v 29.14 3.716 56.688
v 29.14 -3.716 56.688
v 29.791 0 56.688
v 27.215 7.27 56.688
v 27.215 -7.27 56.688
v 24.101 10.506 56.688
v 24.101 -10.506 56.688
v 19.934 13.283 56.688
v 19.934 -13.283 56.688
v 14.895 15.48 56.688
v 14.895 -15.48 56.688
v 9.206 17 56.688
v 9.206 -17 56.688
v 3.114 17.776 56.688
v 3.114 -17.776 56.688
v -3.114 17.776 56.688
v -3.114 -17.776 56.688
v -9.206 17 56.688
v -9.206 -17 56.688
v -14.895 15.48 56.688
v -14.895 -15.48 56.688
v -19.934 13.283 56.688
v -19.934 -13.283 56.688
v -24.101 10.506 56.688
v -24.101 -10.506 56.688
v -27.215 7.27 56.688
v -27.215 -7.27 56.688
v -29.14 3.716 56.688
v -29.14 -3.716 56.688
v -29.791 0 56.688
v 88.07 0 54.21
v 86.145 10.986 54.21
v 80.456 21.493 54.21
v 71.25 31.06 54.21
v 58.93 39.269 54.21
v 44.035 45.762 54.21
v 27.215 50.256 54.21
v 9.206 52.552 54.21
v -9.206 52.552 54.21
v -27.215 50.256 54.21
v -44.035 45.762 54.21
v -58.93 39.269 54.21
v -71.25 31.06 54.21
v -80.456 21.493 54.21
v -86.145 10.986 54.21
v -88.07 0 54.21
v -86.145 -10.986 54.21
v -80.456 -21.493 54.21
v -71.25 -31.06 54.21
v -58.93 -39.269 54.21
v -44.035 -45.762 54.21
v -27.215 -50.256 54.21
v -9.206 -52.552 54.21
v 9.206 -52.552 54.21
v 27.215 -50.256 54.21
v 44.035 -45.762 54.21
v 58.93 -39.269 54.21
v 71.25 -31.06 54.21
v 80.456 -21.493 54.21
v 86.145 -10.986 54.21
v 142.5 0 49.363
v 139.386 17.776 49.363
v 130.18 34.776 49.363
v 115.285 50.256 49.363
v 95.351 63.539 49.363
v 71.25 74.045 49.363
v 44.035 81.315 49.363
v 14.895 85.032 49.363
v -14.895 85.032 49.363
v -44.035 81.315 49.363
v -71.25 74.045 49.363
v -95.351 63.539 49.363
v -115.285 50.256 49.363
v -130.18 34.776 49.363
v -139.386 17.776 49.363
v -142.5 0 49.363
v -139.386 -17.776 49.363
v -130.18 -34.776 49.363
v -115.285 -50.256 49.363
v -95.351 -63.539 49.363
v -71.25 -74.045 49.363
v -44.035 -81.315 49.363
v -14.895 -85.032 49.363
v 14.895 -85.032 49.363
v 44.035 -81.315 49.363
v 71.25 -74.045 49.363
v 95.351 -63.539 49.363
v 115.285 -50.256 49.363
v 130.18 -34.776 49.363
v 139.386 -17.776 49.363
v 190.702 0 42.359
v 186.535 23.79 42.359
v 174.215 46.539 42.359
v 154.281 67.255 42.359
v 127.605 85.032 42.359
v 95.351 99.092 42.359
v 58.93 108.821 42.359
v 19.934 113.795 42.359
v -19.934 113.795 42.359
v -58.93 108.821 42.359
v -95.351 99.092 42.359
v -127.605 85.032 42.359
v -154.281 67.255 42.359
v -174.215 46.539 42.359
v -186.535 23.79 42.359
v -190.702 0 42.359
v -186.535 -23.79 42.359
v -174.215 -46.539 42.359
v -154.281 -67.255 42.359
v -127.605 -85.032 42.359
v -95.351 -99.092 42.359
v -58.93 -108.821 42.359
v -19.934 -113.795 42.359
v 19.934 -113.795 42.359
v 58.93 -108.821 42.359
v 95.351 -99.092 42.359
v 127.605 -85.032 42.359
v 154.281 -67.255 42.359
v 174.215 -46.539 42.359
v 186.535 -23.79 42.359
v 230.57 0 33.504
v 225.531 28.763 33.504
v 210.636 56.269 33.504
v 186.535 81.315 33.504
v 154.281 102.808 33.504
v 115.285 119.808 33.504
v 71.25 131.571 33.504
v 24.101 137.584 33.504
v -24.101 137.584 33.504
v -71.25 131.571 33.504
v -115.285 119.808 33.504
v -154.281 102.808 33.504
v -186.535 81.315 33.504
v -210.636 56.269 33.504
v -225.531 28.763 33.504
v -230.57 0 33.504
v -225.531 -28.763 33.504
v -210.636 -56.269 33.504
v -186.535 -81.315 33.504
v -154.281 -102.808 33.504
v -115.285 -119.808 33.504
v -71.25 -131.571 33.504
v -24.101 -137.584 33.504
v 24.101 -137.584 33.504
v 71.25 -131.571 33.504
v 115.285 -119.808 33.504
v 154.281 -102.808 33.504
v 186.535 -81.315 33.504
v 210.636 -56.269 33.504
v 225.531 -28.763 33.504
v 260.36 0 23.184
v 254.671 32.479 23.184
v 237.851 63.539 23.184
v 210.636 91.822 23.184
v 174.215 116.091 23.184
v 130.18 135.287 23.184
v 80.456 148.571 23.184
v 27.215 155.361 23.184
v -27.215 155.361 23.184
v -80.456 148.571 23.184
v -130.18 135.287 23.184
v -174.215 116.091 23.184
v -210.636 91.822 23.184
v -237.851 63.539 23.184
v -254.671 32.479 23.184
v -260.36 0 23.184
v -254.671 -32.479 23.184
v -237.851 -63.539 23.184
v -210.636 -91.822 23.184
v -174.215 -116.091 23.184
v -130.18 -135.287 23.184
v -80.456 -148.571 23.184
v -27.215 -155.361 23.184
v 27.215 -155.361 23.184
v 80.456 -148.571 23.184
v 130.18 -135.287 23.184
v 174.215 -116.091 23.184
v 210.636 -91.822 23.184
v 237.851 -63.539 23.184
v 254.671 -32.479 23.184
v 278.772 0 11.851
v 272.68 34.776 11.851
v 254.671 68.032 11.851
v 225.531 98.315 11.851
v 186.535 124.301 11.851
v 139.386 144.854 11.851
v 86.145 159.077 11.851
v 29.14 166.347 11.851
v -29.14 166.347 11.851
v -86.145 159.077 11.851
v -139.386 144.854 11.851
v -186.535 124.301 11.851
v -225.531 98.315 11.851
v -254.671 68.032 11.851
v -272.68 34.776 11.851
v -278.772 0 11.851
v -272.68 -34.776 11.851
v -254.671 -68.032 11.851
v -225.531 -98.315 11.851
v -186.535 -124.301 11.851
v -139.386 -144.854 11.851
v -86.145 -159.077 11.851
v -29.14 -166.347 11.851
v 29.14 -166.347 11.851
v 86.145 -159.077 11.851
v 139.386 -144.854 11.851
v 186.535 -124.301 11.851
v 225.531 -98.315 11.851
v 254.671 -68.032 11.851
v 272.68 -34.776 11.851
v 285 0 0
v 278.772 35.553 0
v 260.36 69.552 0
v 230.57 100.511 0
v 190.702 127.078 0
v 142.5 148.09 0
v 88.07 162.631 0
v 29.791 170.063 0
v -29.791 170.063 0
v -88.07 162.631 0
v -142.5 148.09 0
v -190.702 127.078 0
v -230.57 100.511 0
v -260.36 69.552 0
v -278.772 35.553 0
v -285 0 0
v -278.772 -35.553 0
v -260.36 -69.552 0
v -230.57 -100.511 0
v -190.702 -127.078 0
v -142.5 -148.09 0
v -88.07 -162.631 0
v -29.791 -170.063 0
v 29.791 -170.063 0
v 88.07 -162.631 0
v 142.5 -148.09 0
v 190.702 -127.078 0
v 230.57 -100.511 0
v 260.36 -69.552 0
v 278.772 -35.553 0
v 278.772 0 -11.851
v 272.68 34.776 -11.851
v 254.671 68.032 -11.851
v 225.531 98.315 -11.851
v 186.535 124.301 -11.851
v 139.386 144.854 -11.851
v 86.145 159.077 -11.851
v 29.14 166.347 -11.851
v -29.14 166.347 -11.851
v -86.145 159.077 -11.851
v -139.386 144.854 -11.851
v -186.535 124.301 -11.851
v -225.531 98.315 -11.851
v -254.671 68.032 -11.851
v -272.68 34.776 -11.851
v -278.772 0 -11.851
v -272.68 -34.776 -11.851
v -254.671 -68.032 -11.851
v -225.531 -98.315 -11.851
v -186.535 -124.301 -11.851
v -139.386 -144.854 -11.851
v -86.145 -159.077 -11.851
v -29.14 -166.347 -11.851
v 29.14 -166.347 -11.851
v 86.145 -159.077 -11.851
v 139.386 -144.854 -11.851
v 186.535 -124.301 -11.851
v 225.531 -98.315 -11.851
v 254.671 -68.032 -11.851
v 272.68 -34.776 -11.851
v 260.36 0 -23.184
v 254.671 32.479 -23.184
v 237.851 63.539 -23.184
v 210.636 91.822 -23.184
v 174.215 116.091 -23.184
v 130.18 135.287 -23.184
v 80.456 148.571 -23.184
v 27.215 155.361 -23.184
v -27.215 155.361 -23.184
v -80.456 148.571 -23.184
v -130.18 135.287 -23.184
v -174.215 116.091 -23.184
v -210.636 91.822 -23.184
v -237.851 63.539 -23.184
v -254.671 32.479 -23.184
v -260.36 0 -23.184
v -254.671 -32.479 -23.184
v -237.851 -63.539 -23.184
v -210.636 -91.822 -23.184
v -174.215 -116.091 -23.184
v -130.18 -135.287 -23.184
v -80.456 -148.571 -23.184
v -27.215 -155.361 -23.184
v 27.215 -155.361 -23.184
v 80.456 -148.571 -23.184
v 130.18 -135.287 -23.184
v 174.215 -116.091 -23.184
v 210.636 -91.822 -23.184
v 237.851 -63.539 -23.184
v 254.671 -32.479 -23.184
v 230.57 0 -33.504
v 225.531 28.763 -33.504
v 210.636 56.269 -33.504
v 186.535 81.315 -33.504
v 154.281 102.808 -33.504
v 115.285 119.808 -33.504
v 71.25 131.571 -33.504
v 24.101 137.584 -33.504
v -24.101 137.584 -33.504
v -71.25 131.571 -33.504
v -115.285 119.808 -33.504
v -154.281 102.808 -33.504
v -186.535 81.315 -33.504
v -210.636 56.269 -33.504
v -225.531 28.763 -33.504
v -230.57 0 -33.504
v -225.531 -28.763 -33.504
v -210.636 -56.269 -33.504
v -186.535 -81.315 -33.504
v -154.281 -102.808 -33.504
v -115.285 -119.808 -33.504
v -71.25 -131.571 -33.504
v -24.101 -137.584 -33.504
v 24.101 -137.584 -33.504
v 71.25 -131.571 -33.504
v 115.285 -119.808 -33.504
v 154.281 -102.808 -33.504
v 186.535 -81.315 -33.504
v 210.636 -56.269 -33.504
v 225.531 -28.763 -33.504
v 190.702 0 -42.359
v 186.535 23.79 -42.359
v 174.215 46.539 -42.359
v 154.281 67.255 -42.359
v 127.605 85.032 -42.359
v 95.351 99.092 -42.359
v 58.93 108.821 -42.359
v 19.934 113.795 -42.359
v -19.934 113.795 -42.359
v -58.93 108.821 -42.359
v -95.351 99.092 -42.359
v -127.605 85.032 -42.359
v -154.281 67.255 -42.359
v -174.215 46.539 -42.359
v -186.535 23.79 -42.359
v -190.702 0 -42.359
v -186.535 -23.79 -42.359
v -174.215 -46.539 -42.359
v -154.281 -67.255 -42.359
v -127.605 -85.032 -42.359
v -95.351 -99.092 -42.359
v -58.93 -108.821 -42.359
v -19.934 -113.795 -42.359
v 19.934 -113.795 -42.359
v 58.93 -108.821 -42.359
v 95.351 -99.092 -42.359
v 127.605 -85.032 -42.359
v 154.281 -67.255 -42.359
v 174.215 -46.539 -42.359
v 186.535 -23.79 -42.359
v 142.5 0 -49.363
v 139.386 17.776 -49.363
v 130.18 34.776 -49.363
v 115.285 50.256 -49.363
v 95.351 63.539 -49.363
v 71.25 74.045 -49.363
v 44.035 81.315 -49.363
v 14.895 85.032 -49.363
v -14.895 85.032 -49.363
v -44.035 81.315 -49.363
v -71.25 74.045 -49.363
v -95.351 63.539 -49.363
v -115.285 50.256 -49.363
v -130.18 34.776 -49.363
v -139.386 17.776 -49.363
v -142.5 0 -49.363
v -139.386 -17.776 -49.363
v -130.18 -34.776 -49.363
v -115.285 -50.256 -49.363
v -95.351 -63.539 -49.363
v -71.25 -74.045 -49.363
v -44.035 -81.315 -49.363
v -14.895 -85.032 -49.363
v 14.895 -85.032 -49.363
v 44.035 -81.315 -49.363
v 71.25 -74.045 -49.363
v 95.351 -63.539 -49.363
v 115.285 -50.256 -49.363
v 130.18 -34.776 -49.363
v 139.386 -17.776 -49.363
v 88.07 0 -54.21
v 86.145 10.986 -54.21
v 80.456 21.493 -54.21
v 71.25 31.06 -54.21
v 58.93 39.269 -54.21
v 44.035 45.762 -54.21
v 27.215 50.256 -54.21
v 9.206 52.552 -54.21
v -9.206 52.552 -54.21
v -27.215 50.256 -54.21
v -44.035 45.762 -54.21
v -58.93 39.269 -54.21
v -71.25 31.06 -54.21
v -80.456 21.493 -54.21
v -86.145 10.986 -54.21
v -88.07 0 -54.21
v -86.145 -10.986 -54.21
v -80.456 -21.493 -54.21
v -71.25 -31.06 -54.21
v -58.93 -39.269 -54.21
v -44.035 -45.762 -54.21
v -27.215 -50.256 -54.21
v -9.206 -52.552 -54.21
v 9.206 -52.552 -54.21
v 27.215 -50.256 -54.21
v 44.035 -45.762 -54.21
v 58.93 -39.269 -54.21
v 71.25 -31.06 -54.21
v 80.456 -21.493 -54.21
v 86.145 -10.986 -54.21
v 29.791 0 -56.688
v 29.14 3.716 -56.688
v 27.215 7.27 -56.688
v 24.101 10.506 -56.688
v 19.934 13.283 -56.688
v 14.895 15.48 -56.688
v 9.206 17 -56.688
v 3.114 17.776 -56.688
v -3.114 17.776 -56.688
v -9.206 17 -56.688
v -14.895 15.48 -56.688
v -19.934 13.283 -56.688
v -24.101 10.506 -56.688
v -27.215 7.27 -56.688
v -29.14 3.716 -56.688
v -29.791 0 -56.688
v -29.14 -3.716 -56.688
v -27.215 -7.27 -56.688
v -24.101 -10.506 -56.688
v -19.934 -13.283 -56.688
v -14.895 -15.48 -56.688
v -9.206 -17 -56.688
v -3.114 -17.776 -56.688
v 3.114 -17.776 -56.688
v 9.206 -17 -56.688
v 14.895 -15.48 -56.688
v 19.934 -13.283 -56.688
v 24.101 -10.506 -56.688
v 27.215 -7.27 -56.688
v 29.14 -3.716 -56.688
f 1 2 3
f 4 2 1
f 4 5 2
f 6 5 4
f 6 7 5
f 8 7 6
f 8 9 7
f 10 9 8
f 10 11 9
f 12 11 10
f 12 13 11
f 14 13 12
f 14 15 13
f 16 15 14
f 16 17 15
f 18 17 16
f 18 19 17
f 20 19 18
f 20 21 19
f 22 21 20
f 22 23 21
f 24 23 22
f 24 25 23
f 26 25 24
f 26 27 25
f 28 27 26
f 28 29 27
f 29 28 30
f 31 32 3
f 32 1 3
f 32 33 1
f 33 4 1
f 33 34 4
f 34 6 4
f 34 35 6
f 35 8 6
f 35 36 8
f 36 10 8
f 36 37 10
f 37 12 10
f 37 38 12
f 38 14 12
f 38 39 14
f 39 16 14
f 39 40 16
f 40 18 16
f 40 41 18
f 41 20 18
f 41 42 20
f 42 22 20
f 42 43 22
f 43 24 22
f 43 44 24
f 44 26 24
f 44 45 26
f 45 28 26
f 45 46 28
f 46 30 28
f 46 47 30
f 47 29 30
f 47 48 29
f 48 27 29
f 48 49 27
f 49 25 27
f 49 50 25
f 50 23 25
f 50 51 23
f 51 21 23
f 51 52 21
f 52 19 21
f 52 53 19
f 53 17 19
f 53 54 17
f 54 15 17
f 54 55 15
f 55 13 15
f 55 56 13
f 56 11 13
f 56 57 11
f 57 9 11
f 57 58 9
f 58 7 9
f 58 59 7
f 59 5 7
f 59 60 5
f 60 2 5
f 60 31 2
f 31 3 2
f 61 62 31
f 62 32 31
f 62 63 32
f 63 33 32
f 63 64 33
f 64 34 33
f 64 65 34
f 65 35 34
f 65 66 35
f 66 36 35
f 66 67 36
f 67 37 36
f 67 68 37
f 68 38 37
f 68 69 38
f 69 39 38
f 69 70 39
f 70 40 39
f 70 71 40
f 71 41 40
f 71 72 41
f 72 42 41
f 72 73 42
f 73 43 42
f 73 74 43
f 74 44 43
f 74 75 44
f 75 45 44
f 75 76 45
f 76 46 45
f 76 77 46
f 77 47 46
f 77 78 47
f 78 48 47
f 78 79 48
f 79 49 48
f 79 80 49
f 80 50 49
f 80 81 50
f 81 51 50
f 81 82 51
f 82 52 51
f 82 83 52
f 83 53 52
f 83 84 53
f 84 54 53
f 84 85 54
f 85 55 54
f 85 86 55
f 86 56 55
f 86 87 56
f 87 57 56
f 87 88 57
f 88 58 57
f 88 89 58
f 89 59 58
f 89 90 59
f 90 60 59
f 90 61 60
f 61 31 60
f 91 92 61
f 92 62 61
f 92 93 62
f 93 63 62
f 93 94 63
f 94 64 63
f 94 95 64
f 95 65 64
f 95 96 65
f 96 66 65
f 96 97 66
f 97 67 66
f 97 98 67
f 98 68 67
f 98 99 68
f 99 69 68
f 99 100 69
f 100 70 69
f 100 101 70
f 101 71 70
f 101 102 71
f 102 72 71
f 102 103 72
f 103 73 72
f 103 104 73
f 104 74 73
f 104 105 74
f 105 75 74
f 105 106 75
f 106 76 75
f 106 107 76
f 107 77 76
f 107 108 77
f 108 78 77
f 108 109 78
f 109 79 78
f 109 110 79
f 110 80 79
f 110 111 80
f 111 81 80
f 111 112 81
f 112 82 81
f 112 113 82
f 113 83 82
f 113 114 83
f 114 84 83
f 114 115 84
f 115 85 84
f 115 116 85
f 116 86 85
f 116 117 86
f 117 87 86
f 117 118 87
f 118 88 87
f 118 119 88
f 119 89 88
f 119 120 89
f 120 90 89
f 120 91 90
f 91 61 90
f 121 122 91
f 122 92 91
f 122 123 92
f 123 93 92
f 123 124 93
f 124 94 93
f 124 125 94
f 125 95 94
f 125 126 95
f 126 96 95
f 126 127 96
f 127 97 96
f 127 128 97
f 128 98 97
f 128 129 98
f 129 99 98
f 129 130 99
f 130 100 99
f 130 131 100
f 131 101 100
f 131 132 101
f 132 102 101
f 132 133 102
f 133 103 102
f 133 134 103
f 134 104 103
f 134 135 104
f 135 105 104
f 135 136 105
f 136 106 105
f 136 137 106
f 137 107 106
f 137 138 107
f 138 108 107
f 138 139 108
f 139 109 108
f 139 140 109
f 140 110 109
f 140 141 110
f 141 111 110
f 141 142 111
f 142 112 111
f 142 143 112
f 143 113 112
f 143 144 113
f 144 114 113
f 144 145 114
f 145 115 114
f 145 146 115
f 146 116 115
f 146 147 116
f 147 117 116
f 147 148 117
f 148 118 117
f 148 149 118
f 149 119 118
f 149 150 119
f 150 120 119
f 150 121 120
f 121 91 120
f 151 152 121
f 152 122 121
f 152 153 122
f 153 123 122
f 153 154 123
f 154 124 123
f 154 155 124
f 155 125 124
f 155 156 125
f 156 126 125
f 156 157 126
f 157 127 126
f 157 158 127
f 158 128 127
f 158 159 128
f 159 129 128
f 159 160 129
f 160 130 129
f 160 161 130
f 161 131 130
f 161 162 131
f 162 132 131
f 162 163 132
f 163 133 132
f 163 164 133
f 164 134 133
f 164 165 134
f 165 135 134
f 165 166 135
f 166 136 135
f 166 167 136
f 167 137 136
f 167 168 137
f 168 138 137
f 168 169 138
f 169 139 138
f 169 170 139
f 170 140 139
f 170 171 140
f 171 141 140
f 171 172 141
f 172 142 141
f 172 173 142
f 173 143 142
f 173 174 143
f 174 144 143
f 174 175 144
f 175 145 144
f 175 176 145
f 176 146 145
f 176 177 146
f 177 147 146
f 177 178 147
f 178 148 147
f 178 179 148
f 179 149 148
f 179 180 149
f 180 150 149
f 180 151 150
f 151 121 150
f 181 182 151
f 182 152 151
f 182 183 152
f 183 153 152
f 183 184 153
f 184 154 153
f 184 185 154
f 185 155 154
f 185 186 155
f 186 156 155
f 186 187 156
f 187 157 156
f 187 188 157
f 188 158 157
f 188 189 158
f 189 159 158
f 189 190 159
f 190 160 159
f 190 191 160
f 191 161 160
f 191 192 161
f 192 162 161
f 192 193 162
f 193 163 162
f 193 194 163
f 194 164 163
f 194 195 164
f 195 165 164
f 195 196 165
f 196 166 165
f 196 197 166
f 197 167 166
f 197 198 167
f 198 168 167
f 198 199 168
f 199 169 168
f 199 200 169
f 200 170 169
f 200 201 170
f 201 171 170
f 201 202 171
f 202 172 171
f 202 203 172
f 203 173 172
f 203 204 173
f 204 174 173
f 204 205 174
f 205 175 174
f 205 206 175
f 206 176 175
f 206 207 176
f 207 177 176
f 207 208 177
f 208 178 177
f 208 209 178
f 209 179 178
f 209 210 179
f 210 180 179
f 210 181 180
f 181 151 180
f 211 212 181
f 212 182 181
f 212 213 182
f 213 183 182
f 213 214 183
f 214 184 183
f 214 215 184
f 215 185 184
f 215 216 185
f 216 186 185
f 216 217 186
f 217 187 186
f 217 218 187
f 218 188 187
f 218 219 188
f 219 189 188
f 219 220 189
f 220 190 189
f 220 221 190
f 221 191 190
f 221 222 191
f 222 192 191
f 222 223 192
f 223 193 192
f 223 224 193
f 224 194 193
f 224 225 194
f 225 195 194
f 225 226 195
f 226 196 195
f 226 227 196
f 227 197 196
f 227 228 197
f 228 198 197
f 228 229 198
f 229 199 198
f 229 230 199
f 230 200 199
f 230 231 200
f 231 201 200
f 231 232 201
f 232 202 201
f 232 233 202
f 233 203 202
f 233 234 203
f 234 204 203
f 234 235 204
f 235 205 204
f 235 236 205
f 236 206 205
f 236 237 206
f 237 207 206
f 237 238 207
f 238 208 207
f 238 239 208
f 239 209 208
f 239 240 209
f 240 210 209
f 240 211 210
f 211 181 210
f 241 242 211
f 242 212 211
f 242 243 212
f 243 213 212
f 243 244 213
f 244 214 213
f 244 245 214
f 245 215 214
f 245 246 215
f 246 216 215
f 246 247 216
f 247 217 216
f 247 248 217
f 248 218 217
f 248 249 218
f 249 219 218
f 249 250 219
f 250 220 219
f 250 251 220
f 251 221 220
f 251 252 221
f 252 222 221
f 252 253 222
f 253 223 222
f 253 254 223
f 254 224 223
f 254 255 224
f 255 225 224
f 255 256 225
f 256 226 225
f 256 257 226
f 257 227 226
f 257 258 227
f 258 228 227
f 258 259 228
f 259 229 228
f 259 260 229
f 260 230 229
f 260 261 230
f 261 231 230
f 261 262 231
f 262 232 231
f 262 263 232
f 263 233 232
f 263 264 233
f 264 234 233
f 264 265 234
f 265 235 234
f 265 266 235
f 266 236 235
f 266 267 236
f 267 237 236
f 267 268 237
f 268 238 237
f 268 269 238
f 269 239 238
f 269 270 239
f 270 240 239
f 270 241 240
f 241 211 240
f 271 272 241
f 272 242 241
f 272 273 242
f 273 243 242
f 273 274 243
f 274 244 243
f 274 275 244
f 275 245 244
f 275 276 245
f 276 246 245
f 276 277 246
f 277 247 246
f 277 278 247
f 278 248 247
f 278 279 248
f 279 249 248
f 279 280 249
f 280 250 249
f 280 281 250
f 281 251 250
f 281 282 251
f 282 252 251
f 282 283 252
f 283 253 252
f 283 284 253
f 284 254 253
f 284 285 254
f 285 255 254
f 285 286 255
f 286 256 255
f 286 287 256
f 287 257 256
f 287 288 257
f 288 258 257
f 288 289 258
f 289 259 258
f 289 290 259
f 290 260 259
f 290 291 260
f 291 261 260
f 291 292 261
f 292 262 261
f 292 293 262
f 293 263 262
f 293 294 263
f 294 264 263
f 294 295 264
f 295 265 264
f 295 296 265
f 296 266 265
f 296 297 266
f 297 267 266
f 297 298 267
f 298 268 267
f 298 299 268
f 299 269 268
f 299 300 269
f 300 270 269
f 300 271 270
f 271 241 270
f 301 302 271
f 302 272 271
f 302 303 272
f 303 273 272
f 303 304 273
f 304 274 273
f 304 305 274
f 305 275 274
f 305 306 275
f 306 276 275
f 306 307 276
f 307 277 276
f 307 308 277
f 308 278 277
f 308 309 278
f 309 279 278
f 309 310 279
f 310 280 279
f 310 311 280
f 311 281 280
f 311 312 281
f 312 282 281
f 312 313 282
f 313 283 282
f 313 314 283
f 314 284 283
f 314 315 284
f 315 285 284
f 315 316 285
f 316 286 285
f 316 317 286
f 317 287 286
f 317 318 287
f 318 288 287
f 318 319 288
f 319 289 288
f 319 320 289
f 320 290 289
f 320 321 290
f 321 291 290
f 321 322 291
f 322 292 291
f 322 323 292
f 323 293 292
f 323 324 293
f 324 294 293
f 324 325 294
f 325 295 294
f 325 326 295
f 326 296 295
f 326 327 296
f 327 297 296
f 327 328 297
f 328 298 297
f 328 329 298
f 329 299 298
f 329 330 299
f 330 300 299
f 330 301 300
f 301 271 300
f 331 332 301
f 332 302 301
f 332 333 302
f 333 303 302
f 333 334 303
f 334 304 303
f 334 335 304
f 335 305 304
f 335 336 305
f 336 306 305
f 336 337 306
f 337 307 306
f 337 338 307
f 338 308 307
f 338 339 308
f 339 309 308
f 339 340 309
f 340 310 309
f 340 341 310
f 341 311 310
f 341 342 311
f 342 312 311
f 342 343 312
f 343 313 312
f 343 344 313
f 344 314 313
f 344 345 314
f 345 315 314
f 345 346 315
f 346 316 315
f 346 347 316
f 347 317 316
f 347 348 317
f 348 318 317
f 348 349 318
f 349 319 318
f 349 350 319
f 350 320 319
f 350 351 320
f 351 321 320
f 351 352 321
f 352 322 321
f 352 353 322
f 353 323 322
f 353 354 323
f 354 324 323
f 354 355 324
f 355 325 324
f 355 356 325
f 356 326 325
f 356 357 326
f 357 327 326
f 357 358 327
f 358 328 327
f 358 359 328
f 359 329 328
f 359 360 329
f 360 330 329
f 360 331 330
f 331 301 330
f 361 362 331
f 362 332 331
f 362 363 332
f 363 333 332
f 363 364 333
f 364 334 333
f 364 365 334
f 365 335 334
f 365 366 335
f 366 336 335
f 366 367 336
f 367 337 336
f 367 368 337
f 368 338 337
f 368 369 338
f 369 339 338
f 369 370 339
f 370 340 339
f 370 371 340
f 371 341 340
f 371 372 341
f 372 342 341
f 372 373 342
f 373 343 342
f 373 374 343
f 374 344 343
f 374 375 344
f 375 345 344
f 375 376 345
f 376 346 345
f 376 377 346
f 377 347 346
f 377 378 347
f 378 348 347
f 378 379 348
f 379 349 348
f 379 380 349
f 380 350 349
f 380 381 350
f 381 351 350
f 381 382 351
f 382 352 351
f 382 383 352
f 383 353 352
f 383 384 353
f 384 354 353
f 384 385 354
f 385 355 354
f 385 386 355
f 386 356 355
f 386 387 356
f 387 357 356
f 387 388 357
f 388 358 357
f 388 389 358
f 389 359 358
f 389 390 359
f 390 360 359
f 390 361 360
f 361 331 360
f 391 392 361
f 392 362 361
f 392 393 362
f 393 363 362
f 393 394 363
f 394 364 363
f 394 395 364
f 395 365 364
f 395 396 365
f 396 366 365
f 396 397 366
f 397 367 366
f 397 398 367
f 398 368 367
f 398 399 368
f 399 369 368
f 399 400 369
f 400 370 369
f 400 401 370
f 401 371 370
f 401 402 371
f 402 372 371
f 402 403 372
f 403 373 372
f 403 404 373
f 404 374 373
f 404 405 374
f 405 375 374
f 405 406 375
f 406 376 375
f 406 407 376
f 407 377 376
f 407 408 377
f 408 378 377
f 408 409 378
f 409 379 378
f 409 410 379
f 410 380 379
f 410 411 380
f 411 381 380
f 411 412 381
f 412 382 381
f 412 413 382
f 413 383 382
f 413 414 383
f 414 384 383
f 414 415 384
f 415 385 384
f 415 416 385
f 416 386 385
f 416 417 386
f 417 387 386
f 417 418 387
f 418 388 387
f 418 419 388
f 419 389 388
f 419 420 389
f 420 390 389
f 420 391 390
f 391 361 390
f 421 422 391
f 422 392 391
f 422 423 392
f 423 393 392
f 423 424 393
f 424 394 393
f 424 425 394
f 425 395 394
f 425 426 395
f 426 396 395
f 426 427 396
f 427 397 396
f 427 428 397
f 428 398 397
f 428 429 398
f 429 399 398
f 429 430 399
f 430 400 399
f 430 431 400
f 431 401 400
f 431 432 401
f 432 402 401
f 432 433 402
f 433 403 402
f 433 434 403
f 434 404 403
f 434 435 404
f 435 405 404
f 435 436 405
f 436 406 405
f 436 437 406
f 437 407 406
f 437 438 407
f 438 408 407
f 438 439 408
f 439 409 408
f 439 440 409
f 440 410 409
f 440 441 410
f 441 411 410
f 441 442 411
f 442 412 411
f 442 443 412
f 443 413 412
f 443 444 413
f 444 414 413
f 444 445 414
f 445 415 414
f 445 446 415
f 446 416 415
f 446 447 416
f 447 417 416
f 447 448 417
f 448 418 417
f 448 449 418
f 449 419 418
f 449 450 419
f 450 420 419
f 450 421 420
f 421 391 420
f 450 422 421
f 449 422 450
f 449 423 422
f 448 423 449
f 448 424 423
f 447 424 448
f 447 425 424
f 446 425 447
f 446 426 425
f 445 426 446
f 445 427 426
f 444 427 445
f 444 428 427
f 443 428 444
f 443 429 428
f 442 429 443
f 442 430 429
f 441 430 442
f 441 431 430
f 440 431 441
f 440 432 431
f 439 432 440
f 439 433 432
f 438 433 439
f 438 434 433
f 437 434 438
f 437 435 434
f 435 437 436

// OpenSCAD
// Generated by SolidPython 1.0.1 on 2020-07-29 00:46:51


scale(v = [15, 9, 3]) {
	sphere(r = 19);
}
/***********************************************
*********      SolidPython code:      **********
************************************************
 
# import packages: SolidPython
from solid import *
from solid.utils import *
from itertools import chain, combinations, permutations


class Resize:

    def __init__(self, scad_file):
        self.scad_file = scad_file
        #self.scad_file = import_scad(scad_file)
        # cone/cylinder param:
        self.r1 = 0
        self.r2 = 0
        self.h = 0
        # rectangular prism param:
        self.w = 0
        self.l = 0
        # ellipse param:
        self.r = 0

    # import OpenScad code (file name corresponds to shape)


    # classify shape + parameters
    def assign(self, param1, param2, param3):
        if self.scad_file == 'cone.scad':
            self.r1 = param1
            self.r2 = param2
            self.h = param3
        elif self.scad_file == 'cylinder.scad':
            self.r1 = param1
            self.r2 = param2
            self.h = param3
        elif self.scad_file == 'rectangularPrism.scad':
            self.h = param1
            self.l = param2
            self.w = param3
        else:
            self.r = param1
            self.h = param2

    # resize parameters
    def iterate(self):
        x = range(3, 20, 2)
        i = 1
        if self.scad_file == 'cone.scad':
            tempList = list(permutations(x, 2))
            for temp in tempList:
                param1 = temp[0]
                param2 = temp[1]
                filepath = 'produced_scad_files/' + 'cone' + str(param1) + '_' + str(param2) + '_' + '.scad'
                scad_render_to_file(cylinder(h=param1, r1=param2, r2=0), filepath)

        elif self.scad_file == 'cylinder.scad':
            tempList = list(permutations(x, 3))
            for temp in tempList:
                param1 = temp[0]
                param2 = temp[1]
                filepath = 'produced_scad_files/' + 'cylinder' + str(param1) + '_' + str(param2) + '_' + '.scad'
                scad_render_to_file(cylinder(h=param1, r1=param2, r2=param2), filepath)

        elif self.scad_file == 'rectangularPrism.scad':
            tempList = list(permutations(x, 3))
            for temp in tempList:
                param1 = temp[0]
                param2 = temp[1]
                param3 = temp[2]
                filepath = 'produced_scad_files/' + 'rectangularPrism' + str(param1) + '_' + str(param2) + '_' + str(
                    param3) + '.scad'
                scad_render_to_file(cube(size=(param1, param2, param3)), filepath)

        elif self.scad_file == 'ellipse.scad':
            tempList = list(permutations(x, 4))
            for temp in tempList:
                param1 = temp[0]
                param2 = temp[1]
                param3 = temp[2]
                param4 = temp[3]
                filepath = 'produced_scad_files/' + 'ellipse' + str(param1) + '_' + str(param2) + '_' + str(param3) + '_' + str(param4) + '.scad'
                scad_render_to_file(scale([param1, param2, param3])(sphere(r=param4)), filepath)

    def render_to_scadfile(self):
        scad_render_to_file(scad, 'example.scad') 
 
************************************************/
